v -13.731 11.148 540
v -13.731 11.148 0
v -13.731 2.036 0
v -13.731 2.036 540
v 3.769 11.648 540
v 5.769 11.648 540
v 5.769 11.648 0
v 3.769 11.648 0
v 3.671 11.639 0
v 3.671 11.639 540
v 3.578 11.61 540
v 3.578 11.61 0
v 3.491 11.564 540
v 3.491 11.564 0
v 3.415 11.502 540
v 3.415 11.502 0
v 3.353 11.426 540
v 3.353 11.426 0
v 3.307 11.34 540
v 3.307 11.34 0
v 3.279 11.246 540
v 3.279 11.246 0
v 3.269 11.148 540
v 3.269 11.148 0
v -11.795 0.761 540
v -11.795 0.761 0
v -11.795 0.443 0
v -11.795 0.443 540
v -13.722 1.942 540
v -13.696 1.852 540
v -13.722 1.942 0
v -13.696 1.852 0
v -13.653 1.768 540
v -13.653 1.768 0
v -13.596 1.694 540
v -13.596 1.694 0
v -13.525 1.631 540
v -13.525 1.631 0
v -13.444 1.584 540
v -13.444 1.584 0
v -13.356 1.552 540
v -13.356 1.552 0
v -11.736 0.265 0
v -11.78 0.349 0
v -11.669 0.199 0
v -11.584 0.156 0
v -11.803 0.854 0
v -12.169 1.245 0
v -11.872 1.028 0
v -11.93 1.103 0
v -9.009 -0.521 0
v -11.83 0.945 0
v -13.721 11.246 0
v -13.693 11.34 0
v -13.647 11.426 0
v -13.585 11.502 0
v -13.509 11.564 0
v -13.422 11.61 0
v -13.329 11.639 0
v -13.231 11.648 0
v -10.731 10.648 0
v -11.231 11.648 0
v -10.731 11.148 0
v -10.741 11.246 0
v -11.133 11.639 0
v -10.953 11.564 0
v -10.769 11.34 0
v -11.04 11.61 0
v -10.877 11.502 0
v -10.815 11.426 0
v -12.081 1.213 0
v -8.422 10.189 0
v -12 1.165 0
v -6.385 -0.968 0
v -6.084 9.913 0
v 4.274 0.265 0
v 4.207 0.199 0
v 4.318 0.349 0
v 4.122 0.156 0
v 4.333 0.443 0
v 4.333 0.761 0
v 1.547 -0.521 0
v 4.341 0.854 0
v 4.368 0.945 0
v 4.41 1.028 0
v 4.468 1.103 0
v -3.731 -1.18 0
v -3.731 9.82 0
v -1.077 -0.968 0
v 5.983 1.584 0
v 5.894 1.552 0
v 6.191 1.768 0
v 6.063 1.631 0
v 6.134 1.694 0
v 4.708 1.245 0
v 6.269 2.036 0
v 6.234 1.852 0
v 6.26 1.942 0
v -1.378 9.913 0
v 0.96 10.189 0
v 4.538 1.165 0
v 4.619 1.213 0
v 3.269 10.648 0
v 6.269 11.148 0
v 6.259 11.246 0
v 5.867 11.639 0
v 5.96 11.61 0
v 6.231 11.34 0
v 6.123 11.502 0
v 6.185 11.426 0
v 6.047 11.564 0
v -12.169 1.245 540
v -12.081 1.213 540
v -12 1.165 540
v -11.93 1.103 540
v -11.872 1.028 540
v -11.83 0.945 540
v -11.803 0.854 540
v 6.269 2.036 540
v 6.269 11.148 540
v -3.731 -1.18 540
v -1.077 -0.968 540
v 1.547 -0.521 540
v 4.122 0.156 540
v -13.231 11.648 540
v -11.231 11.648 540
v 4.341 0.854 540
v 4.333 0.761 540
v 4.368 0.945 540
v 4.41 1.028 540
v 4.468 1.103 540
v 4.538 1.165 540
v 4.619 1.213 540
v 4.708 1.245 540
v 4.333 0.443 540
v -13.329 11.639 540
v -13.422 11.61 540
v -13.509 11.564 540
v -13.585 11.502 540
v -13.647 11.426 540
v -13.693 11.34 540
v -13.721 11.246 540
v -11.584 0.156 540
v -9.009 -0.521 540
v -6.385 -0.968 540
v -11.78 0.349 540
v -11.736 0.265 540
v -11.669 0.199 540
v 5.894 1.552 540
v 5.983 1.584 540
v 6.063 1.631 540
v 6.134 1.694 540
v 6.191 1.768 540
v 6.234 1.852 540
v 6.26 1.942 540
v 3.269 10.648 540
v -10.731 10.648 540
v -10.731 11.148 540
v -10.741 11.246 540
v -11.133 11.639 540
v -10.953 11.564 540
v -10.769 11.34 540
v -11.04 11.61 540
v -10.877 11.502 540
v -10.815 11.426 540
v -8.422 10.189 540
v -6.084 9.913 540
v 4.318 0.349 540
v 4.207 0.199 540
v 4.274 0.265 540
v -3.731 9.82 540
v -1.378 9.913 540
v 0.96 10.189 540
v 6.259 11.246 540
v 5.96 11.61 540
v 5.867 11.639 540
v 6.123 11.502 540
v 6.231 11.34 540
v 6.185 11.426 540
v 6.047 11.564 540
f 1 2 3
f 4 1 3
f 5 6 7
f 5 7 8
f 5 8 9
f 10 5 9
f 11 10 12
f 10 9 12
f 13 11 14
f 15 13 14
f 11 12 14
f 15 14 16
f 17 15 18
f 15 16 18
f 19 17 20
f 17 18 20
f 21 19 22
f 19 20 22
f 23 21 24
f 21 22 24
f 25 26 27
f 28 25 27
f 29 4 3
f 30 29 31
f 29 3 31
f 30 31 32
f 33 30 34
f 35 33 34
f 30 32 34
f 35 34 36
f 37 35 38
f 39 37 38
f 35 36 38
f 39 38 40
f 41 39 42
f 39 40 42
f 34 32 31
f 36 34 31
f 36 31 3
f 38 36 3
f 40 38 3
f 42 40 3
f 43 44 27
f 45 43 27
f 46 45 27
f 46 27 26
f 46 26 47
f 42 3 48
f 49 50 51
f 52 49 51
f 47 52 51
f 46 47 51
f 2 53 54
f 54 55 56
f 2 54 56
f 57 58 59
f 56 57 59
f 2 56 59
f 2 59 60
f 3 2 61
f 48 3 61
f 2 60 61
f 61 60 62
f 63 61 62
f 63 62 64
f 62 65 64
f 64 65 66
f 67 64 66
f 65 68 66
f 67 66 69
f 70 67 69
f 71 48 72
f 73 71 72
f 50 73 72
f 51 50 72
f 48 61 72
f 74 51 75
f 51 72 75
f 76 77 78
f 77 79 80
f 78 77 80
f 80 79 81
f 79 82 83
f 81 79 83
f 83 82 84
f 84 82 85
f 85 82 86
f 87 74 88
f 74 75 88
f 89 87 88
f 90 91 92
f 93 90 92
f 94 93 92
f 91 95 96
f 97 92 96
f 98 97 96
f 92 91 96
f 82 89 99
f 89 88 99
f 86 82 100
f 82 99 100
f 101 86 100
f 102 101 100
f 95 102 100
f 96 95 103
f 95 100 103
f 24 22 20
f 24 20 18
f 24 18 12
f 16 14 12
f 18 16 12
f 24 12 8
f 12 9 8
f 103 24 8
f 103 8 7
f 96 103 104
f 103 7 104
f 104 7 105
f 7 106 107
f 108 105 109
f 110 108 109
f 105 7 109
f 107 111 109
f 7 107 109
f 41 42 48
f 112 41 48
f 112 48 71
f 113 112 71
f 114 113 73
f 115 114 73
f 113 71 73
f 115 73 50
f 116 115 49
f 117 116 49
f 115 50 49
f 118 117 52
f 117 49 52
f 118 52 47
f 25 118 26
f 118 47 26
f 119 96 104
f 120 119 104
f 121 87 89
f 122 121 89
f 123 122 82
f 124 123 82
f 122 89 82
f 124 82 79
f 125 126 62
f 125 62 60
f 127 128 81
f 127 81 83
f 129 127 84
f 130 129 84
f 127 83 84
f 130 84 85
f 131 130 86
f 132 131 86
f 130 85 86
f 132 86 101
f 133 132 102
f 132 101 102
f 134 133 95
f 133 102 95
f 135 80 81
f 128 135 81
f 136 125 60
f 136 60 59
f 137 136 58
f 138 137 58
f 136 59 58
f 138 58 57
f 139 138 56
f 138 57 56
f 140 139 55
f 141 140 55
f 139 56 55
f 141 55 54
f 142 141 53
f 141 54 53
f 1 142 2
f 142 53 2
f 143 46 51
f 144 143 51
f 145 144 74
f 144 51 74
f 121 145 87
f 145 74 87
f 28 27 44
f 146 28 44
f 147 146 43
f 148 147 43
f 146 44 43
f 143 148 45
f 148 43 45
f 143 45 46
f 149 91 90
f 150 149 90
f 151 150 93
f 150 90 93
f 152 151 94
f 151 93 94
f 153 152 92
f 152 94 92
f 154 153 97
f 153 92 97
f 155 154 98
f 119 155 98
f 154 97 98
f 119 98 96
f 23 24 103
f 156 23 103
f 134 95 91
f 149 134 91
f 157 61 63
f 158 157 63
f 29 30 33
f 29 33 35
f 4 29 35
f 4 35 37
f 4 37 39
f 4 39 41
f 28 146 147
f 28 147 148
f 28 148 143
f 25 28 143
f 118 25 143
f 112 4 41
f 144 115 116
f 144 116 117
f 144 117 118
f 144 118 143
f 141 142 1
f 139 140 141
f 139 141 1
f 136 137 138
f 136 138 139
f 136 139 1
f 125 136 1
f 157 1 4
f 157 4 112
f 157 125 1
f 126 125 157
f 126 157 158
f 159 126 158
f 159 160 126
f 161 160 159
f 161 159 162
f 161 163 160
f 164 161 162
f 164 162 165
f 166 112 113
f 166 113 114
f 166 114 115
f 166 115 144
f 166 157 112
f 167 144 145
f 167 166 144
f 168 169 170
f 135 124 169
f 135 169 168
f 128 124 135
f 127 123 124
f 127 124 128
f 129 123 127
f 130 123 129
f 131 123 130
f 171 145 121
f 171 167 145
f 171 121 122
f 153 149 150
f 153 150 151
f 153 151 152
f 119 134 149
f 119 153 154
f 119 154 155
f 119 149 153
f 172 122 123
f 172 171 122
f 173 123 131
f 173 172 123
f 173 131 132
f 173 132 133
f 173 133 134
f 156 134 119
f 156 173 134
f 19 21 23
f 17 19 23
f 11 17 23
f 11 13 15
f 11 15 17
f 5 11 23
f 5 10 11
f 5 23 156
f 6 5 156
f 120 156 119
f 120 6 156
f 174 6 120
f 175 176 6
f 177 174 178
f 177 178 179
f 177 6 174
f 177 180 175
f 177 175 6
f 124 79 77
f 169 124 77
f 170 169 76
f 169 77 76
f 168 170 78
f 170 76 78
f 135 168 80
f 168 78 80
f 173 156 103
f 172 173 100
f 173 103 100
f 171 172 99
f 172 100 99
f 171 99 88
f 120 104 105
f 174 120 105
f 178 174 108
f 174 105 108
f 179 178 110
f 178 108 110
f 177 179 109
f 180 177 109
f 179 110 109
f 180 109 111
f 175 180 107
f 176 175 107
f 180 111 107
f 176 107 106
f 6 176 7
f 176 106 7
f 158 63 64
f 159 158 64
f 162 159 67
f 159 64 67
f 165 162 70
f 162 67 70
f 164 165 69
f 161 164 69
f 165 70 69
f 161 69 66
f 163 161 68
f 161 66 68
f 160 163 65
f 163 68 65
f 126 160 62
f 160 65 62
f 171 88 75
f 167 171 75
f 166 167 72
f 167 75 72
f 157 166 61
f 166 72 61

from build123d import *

# Parameters (mm, degrees)
SALIENTE_EXTRUIR1_DEPTH = 540


with BuildPart() as part:
    # Croquis1 → Saliente-Extruir1 (new body)
    with BuildSketch(Plane.XY):
        with BuildLine():
            ThreePointArc((-13.23096405, 11.648445498), (-13.584517441, 11.501998889), (-13.73096405, 11.148445498))
            Line((-13.73096405, 11.148445498), (-13.73096405, 2.035658412))
            ThreePointArc((-13.73096405, 2.035658412), (-13.626281451, 1.729514406), (-13.356067441, 1.551562201))
            Line((-13.356067441, 1.551562201), (-12.169475815, 1.244915231))
            ThreePointArc((-12.169475815, 1.244915231), (-11.899261805, 1.066963026), (-11.794579206, 0.76081902))
            Line((-11.794579206, 0.76081902), (-11.794579206, 0.442917518))
            ThreePointArc((-11.794579206, 0.442917518), (-11.736179814, 0.265071669), (-11.583718232, 0.156466416))
            ThreePointArc((-11.583718232, 0.156466416), (-7.701884055, -0.773383829), (-3.73096405, -1.17965021))
            ThreePointArc((-3.73096405, -1.17965021), (0.239955955, -0.773383829), (4.121790132, 0.156466416))
            ThreePointArc((4.121790132, 0.156466416), (4.274251714, 0.265071669), (4.332651106, 0.442917518))
            Line((4.332651106, 0.442917518), (4.332651106, 0.76081902))
            ThreePointArc((4.332651106, 0.76081902), (4.437333704, 1.066963026), (4.707547715, 1.244915231))
            Line((4.707547715, 1.244915231), (5.894139341, 1.551562201))
            ThreePointArc((5.894139341, 1.551562201), (6.164353351, 1.729514406), (6.26903595, 2.035658412))
            Line((6.26903595, 2.035658412), (6.26903595, 11.148445498))
            ThreePointArc((6.26903595, 11.148445498), (6.12258934, 11.501998889), (5.76903595, 11.648445498))
            Line((5.76903595, 11.648445498), (3.76903595, 11.648445498))
            ThreePointArc((3.76903595, 11.648445498), (3.415482559, 11.501998889), (3.26903595, 11.148445498))
            Line((3.26903595, 11.148445498), (3.26903595, 10.648445498))
            ThreePointArc((3.26903595, 10.648445498), (-0.206558338, 10.028093004), (-3.73096405, 9.82034979))
            ThreePointArc((-3.73096405, 9.82034979), (-7.255369763, 10.028093004), (-10.73096405, 10.648445498))
            Line((-10.73096405, 10.648445498), (-10.73096405, 11.148445498))
            ThreePointArc((-10.73096405, 11.148445498), (-10.87741066, 11.501998889), (-11.23096405, 11.648445498))
            Line((-11.23096405, 11.648445498), (-13.23096405, 11.648445498))
        make_face()
    extrude(amount=SALIENTE_EXTRUIR1_DEPTH)


solid = part.part
